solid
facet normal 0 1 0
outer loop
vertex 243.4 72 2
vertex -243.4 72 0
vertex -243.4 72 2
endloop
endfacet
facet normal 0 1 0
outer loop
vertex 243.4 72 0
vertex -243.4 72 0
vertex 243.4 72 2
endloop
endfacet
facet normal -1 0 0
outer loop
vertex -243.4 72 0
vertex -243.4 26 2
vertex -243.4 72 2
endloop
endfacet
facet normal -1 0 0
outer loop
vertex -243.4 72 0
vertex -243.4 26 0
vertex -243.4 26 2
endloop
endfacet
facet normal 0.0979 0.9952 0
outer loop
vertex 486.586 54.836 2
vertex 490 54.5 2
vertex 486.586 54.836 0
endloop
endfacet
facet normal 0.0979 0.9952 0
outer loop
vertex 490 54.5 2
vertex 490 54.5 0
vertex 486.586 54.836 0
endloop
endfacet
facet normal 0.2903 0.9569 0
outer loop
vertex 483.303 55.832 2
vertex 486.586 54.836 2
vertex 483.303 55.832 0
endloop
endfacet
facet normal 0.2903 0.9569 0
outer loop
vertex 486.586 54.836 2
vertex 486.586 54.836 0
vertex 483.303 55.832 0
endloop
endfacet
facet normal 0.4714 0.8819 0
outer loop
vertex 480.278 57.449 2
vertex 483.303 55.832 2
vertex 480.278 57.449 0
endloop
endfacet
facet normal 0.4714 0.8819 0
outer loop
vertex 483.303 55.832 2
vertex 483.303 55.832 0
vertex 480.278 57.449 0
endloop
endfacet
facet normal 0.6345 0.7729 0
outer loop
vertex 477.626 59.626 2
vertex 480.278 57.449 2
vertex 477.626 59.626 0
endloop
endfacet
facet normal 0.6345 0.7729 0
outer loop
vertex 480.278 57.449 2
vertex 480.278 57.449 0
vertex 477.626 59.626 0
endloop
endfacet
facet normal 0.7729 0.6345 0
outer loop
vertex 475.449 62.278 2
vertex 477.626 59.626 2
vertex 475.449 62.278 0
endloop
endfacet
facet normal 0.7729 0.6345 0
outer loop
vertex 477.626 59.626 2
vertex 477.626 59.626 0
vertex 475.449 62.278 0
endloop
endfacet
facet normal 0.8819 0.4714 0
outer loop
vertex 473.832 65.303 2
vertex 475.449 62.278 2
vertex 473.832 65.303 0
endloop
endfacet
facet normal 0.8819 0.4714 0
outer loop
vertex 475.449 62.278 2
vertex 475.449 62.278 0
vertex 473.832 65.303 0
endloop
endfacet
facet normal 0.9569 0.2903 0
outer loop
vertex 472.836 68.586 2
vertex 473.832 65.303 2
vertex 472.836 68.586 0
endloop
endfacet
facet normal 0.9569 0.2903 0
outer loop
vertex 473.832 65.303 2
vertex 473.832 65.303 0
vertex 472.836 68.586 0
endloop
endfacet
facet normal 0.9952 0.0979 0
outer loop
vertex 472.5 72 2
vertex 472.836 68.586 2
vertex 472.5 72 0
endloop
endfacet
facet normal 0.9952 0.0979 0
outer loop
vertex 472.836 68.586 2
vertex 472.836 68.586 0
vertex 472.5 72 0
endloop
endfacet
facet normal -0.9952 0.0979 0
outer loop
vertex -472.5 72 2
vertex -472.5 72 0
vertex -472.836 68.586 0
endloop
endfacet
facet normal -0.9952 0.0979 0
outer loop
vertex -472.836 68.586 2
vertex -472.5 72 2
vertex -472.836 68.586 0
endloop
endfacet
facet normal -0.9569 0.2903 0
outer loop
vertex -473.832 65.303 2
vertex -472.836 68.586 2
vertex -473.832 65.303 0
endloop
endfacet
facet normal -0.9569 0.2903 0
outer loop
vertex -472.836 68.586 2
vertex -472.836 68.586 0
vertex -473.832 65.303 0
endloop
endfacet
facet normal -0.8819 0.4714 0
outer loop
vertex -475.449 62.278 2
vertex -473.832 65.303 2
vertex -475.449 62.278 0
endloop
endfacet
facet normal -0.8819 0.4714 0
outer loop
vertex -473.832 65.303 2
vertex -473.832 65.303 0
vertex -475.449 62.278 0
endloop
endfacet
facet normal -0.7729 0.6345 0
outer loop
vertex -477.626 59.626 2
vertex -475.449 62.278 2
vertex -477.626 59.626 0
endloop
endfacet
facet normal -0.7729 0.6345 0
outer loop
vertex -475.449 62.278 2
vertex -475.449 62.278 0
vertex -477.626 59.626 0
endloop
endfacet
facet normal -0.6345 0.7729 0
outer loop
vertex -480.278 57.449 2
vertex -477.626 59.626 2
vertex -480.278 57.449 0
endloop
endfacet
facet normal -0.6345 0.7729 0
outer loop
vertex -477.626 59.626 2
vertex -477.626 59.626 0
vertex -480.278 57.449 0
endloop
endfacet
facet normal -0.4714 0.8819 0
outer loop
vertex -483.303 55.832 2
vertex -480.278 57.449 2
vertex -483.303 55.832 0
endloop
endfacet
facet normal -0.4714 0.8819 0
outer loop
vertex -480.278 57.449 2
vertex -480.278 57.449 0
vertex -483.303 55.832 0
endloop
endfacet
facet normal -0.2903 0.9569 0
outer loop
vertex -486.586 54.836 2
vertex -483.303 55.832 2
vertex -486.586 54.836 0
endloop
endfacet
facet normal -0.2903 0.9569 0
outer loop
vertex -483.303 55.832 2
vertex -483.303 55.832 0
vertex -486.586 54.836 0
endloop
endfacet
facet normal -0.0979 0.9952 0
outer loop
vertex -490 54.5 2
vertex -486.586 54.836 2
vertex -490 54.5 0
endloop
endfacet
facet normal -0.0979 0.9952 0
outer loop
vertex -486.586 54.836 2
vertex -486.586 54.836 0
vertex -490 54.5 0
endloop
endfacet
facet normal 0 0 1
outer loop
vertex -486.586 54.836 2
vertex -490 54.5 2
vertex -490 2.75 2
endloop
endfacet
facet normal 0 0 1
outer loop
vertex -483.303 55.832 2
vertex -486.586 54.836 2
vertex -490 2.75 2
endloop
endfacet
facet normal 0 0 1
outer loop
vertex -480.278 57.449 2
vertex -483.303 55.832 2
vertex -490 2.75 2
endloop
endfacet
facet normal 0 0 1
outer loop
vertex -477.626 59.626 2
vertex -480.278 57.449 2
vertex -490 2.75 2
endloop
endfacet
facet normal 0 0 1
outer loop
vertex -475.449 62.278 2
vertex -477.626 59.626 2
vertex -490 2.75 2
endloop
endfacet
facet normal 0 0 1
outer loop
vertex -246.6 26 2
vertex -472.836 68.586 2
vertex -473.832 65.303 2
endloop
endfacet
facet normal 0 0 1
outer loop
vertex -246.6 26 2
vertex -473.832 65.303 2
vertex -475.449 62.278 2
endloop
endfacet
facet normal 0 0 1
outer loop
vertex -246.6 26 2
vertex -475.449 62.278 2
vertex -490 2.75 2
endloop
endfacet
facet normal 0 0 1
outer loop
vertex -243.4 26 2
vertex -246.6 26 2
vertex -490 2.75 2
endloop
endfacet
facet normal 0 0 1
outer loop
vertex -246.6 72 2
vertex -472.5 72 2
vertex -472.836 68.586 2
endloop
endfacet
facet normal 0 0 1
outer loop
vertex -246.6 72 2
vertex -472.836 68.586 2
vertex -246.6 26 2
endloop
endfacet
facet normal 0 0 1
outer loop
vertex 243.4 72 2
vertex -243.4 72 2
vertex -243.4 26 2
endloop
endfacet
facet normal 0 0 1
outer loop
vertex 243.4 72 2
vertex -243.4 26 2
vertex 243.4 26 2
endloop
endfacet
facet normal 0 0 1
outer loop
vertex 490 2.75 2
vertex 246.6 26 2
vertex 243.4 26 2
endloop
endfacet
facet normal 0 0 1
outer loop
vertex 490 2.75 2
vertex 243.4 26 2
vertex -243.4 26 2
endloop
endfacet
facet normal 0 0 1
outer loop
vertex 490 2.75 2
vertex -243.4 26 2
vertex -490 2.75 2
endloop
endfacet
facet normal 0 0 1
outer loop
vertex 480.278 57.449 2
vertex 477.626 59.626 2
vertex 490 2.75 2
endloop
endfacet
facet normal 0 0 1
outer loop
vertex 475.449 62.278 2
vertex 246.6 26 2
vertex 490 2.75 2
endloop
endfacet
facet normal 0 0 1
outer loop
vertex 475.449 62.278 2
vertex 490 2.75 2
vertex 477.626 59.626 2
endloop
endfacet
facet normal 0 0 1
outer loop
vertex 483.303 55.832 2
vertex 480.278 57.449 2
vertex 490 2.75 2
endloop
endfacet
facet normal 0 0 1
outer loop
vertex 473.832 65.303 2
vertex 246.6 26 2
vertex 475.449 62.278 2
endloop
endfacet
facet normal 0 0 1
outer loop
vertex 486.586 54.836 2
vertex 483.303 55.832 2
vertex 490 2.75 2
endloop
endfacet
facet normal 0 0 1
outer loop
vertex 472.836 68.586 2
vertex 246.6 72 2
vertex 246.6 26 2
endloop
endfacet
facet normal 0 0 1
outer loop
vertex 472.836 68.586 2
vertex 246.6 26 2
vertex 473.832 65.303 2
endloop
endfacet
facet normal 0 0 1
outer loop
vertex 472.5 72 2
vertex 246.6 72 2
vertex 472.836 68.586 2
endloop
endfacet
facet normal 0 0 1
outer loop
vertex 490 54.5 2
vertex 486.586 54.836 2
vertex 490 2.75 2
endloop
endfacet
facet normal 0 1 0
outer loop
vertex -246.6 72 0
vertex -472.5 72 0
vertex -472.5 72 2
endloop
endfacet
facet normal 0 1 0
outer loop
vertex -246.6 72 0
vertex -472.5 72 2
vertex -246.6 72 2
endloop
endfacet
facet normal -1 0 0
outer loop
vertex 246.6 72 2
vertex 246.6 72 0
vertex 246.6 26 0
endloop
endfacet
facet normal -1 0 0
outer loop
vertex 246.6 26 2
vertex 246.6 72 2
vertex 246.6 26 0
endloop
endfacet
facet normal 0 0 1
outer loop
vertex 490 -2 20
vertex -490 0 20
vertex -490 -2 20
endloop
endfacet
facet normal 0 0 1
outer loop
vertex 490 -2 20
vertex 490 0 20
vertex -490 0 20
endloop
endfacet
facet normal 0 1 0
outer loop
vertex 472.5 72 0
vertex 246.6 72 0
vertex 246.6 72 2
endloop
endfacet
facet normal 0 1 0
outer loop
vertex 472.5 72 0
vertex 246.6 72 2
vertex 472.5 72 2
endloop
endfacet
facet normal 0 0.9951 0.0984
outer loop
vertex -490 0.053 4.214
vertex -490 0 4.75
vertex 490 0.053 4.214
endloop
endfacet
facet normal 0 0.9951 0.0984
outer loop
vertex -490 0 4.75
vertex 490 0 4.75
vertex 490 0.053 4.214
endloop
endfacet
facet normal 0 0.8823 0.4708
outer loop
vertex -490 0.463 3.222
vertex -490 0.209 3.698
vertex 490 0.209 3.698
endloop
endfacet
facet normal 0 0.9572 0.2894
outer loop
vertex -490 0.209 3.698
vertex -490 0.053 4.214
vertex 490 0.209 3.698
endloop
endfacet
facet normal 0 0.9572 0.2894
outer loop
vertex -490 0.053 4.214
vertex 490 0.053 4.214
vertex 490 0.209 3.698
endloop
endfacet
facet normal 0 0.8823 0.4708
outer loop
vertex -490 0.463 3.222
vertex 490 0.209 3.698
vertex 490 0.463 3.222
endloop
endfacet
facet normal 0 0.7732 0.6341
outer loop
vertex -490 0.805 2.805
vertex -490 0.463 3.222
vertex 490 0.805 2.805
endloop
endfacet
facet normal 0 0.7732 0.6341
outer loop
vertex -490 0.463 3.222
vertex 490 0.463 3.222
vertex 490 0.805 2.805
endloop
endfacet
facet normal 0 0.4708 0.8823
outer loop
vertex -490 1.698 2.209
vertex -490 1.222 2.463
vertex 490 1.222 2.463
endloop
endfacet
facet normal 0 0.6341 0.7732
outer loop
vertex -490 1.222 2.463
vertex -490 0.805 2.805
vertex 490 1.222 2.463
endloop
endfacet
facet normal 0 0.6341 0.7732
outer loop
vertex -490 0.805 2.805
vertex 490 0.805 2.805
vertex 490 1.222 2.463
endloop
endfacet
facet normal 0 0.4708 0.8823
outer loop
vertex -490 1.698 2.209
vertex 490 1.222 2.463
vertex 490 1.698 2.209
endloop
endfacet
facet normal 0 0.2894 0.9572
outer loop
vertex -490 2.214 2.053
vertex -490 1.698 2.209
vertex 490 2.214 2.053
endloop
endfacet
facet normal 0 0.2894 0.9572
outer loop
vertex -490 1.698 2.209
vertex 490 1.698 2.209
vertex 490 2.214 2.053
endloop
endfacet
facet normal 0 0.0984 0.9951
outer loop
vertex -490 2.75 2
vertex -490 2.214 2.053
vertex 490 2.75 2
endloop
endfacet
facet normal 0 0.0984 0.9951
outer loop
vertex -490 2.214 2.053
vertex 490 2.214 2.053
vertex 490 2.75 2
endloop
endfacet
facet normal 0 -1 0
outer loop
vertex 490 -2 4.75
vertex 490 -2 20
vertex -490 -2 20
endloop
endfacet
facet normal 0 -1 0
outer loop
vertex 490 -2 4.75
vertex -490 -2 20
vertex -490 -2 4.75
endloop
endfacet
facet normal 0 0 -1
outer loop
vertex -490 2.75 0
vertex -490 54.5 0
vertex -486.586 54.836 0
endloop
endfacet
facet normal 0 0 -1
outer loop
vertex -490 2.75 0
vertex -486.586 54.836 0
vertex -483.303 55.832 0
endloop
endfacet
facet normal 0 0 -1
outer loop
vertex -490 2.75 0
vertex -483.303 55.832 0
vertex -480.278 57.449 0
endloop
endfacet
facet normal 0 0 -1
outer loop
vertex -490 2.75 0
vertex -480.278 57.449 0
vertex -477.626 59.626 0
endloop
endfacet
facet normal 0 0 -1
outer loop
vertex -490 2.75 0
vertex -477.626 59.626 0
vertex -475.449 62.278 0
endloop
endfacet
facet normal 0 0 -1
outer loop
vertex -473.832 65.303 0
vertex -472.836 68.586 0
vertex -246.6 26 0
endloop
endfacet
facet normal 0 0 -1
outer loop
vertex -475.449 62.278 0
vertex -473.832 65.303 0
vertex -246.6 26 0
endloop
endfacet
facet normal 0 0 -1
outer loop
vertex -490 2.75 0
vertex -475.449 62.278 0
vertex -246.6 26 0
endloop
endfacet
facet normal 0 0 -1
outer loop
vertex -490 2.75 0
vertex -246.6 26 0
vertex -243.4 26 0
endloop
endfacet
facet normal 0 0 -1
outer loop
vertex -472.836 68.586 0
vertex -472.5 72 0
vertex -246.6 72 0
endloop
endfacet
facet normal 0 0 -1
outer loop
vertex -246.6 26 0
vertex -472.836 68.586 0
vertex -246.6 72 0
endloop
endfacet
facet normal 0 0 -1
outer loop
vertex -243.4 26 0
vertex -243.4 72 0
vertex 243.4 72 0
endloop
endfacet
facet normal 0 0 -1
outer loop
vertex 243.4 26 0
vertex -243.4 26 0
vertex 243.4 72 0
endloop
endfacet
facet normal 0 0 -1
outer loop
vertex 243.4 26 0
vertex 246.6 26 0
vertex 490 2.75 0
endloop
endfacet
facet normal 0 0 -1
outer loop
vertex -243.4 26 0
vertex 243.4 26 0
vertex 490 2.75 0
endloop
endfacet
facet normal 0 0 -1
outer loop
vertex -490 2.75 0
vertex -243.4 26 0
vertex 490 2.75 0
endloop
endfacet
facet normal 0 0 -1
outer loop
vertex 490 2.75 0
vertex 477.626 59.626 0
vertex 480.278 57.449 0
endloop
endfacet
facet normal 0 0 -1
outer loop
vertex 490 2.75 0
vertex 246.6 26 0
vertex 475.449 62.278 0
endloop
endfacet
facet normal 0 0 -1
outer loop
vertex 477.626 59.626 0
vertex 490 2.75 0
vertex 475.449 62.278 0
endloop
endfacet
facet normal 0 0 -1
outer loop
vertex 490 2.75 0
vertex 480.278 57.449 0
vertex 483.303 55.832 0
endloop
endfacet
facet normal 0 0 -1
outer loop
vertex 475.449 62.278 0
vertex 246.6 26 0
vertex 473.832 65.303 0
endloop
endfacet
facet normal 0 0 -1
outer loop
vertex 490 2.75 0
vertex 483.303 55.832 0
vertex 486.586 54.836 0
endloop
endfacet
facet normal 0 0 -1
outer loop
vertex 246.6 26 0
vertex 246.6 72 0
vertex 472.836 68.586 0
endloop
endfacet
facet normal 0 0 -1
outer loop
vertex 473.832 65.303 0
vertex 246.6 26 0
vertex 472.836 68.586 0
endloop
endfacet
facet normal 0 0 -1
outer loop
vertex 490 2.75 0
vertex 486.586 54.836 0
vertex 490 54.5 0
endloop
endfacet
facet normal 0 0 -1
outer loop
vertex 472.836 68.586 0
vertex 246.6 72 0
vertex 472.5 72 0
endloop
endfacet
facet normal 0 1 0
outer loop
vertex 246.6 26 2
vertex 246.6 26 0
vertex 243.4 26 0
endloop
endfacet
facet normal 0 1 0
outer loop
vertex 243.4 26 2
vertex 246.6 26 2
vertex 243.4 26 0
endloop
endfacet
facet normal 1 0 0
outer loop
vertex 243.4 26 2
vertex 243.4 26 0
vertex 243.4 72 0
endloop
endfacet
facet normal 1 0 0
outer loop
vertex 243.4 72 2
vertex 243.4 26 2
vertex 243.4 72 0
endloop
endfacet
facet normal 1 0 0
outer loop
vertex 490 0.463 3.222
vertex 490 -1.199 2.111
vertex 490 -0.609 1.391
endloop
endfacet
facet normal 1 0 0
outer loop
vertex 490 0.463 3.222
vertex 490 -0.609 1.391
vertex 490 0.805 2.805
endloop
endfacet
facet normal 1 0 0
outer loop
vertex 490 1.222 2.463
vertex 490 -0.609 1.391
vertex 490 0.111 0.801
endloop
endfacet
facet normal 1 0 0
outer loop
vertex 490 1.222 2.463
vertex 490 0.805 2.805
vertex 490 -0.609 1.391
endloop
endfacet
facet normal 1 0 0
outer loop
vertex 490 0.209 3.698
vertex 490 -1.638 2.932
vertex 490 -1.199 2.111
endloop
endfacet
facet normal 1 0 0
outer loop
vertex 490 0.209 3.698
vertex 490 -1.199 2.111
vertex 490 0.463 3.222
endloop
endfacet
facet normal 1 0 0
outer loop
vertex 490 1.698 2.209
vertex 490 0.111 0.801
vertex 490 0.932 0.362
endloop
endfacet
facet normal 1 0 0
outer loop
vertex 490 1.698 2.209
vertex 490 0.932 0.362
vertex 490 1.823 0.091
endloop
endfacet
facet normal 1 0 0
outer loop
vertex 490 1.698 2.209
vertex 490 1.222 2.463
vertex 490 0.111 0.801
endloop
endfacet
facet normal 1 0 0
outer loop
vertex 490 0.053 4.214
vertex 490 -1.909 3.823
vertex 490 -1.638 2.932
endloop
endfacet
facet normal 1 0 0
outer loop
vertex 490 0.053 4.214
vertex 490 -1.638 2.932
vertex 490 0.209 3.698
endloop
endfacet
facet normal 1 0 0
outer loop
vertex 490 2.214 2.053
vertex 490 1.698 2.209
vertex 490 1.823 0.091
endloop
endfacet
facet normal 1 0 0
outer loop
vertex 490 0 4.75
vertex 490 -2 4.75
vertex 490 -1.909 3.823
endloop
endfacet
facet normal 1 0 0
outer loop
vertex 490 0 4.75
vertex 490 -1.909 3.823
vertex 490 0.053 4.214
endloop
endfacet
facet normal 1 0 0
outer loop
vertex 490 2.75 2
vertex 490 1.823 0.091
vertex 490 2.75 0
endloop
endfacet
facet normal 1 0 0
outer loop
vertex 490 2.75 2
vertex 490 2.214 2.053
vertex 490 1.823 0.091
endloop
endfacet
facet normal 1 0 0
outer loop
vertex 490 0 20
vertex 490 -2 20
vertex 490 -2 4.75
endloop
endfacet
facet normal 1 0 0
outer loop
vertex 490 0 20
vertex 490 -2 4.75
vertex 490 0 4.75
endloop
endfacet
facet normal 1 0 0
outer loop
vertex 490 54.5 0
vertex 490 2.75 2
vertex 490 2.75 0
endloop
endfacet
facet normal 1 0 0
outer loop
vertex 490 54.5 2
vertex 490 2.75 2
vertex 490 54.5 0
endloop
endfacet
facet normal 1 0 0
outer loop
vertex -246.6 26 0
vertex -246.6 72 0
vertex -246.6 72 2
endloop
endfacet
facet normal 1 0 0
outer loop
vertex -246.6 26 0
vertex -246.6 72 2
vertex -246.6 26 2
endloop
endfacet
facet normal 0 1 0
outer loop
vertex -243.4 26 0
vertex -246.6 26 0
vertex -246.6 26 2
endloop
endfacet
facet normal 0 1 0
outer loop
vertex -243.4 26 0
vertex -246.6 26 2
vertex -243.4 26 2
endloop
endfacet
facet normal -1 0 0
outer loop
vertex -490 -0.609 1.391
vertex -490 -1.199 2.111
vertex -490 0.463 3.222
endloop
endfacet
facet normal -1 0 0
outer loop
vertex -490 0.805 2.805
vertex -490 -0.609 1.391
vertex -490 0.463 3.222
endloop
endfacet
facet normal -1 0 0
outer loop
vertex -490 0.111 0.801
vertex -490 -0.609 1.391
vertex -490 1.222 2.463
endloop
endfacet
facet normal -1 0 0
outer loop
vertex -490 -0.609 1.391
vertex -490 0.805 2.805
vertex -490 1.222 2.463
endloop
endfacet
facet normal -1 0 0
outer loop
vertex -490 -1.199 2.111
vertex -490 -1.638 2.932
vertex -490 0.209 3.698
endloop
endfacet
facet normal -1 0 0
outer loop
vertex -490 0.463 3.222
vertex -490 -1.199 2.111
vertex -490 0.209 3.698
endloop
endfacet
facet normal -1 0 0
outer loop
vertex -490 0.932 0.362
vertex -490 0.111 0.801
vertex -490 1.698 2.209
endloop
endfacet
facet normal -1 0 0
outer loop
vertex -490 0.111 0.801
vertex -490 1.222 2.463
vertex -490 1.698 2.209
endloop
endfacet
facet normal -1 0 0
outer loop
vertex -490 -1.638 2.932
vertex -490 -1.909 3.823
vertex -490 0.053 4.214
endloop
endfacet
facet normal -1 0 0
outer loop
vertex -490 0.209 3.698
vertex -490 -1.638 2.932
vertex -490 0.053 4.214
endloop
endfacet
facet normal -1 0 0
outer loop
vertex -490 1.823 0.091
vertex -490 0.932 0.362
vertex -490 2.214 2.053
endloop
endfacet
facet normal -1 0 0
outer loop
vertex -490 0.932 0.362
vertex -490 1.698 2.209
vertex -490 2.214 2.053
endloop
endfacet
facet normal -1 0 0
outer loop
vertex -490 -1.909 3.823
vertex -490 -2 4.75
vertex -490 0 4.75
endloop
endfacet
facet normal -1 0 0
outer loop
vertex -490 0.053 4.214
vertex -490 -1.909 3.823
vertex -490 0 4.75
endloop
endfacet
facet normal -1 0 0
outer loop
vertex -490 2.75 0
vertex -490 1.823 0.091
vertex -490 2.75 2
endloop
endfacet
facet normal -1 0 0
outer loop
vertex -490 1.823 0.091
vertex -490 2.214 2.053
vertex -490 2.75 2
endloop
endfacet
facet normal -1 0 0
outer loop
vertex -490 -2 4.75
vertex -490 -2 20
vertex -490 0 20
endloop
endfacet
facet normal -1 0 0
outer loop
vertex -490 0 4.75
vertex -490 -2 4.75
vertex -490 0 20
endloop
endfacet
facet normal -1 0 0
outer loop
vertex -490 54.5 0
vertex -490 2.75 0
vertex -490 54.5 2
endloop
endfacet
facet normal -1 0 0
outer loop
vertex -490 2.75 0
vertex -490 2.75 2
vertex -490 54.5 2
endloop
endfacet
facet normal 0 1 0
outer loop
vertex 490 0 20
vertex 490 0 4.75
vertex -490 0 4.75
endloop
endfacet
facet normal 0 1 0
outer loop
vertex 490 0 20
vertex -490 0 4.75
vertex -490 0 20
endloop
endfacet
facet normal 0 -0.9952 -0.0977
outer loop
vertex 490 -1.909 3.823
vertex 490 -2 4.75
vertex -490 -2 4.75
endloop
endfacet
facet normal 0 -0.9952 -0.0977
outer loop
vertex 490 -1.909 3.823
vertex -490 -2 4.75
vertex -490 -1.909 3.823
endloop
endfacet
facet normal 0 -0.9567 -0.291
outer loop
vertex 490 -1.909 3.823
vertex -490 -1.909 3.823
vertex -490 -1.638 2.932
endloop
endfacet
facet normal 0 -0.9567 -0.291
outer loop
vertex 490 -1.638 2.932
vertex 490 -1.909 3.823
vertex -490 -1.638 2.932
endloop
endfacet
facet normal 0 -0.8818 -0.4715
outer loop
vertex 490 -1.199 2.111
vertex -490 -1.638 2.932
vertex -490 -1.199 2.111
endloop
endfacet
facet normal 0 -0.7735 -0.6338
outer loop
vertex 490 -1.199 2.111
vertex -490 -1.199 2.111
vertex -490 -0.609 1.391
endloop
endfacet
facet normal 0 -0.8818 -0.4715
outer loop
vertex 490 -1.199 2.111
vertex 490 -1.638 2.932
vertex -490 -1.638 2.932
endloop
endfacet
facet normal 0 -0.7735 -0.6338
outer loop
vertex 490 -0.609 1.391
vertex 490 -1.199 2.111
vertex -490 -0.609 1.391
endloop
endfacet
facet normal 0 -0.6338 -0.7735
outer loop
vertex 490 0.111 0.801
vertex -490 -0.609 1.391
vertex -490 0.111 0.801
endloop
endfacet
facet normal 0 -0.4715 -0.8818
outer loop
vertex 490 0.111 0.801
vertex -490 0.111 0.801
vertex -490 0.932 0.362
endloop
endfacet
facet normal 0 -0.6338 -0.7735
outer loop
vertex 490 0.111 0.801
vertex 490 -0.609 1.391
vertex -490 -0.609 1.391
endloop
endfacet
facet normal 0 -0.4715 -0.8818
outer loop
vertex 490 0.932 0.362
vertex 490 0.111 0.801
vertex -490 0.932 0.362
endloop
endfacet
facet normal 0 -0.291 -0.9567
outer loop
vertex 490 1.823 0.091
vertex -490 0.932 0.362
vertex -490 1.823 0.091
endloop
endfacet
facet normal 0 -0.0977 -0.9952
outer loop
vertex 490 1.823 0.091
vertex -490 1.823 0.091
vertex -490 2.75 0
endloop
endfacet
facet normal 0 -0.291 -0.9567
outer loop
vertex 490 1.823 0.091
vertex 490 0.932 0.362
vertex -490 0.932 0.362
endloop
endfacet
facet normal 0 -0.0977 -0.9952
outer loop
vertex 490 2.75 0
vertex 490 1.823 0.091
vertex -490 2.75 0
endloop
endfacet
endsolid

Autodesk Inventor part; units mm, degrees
ref_plane "YZ Plane" through (0, 0, 0) normal (1, 0, 0) x (0, 1, 0)
ref_plane "XZ Plane" through (0, 0, 0) normal (0, 1, 0) x (-1, 0, 0)
ref_plane "XY Plane" through (0, 0, 0) normal (0, 0, 1) x (1, 0, 0)
sketch "Sketch1" plane through (0, 0, 0) normal (0, 0, 1) x (1, 0, 0)
  line L0 (-490, 72) -> (490, 72)
  line L1 (490, 72) -> (490, 0)
  line L2 (490, 0) -> (-490, 0)
  line L3 (-490, 0) -> (-490, 72)
  point P0 (0, 0)
  point P1 (0, 0)
  dimension "d0" = 980
  dimension "d1" = 72
extrude "Plate1" add sketch "Sketch1" along normal blind 2
sketch "Sketch2" plane through (490, -2, 0) normal (0, 1, 0) x (-1, 0, 0)
  line L0 (980, 0) -> (0, 0)
  line L1 (0, 0) -> (0, 20)
  line L2 (0, 20) -> (980, 20)
  line L3 (980, 20) -> (980, 0)
edge flange "Flange1" height 20 angle 90 thickness 2 bend radius 2.75 thickness toward (0, 1, 0) relief round relief width 2 relief depth 1 edges at (0, 0, 2) wall of the first edge with corners at (-490, -2, 0) (490, -2, 0) (490, -2, 20) (-490, -2, 20)
bend "Bend1"
corner "Corner1"
sketch "Sketch5" plane through (0, 0, 0) normal (0, 0, -1) x (-1, 0, 0)
  line L0 (490, 72) -> (-490, 72) projected
  line L1 (490, -2) -> (-490, -2) projected
  circle A0 centre (0, 72) radius 17.5
  line L2 (243.4, 72) -> (246.6, 72)
  line L3 (246.6, 72) -> (246.6, 26)
  line L4 (246.6, 26) -> (243.4, 26)
  line L5 (243.4, 26) -> (243.4, 72)
  line L6 (-243.4, 72) -> (-246.6, 72)
  line L7 (-246.6, 72) -> (-246.6, 26)
  line L8 (-246.6, 26) -> (-243.4, 26)
  line L9 (-243.4, 26) -> (-243.4, 72)
  line L10 (0, 72) -> (0, -2) construction
  line L11 (-490, -2) -> (-490, 72)
  line L12 (490, -2) -> (490, 72)
  circle A1 centre (-490, 72) radius 17.5
  circle A2 centre (490, 72) radius 17.5
  point P0 (0, 0)
  point P1 (245, 26)
  point P2 (-245, 26)
  point P3 (246.6, 72)
  point P4 (-17.5, 72)
  point P5 (17.5, 72)
  point P6 (-246.6, 72)
  point P7 (472.5, 72)
  point P8 (490, 54.5)
  point P9 (-490, 54.5)
  point P10 (-472.5, 72)
  dimension "d45" = 35
  dimension "d48" = 3.2
  dimension "d49" = 490
  dimension "d51" = 28
  dimension "d52" = 46
extrude "Extrusion1" cut sketch "Sketch5" against normal through all contours L3 L4 L5 L0 | L0 L12 A2 | L9 L8 L7 L0 | L11 L0 A1 picked at (478.4796, 70.702) picked at (-478.4796, 70.702)
sketch "Sketch9" plane through (0, 0, 2) normal (0, 0, 1) x (1, 0, 0)
  line L0 (467.0539, 27.7998) -> (467.0539, 15.7998) construction
  line L1 (467.0539, 15.7998) -> (267.0539, 15.7998) construction
  line L2 (267.0539, 15.7998) -> (267.0539, 27.7998) construction
  line L3 (267.0539, 27.7998) -> (467.0539, 27.7998) construction
  line L4 (-490, 72) -> (490, 72) projected
  point P0 (0, 0)
  point P1 (1.05, 68)
  point P2 (490, 72)
  point P3 (-490, 72)
  dimension "d40" = 200
  dimension "d41" = 12
mark "Mark2"
equation "\"d2\" = Thickness"
equation "\"d3\" = BendReliefWidth"
equation "\"d4\" = BendReliefDepth"
equation "\"d5\" = MinimumRemnant"
equation "\"d6\" = TransitionRadius"
equation "\"d9\" = BendRadius"
equation "\"d10\" = CornerReliefSize"
equation "\"d11\" = GapSize"
equation "\"d12\" = JacobiRadiusSize"
equation "\"BendReliefWidth\" = Thickness"
equation "\"BendReliefDepth\" = 0.5 * Thickness"
equation "\"CornerReliefSize\" = 4 * Thickness"
equation "\"MinimumRemnant\" = 2 * Thickness"
equation "\"TransitionRadius\" = BendRadius"
equation "\"JacobiRadiusSize\" = BendRadius"
equation "\"GapSize\" = Thickness"
equation "\"Thickness\" = 2"
equation "\"BendRadius\" = 2.75"
properties part number "MSC 344 stringer BOARD  ####" material "Stainless Steel"
